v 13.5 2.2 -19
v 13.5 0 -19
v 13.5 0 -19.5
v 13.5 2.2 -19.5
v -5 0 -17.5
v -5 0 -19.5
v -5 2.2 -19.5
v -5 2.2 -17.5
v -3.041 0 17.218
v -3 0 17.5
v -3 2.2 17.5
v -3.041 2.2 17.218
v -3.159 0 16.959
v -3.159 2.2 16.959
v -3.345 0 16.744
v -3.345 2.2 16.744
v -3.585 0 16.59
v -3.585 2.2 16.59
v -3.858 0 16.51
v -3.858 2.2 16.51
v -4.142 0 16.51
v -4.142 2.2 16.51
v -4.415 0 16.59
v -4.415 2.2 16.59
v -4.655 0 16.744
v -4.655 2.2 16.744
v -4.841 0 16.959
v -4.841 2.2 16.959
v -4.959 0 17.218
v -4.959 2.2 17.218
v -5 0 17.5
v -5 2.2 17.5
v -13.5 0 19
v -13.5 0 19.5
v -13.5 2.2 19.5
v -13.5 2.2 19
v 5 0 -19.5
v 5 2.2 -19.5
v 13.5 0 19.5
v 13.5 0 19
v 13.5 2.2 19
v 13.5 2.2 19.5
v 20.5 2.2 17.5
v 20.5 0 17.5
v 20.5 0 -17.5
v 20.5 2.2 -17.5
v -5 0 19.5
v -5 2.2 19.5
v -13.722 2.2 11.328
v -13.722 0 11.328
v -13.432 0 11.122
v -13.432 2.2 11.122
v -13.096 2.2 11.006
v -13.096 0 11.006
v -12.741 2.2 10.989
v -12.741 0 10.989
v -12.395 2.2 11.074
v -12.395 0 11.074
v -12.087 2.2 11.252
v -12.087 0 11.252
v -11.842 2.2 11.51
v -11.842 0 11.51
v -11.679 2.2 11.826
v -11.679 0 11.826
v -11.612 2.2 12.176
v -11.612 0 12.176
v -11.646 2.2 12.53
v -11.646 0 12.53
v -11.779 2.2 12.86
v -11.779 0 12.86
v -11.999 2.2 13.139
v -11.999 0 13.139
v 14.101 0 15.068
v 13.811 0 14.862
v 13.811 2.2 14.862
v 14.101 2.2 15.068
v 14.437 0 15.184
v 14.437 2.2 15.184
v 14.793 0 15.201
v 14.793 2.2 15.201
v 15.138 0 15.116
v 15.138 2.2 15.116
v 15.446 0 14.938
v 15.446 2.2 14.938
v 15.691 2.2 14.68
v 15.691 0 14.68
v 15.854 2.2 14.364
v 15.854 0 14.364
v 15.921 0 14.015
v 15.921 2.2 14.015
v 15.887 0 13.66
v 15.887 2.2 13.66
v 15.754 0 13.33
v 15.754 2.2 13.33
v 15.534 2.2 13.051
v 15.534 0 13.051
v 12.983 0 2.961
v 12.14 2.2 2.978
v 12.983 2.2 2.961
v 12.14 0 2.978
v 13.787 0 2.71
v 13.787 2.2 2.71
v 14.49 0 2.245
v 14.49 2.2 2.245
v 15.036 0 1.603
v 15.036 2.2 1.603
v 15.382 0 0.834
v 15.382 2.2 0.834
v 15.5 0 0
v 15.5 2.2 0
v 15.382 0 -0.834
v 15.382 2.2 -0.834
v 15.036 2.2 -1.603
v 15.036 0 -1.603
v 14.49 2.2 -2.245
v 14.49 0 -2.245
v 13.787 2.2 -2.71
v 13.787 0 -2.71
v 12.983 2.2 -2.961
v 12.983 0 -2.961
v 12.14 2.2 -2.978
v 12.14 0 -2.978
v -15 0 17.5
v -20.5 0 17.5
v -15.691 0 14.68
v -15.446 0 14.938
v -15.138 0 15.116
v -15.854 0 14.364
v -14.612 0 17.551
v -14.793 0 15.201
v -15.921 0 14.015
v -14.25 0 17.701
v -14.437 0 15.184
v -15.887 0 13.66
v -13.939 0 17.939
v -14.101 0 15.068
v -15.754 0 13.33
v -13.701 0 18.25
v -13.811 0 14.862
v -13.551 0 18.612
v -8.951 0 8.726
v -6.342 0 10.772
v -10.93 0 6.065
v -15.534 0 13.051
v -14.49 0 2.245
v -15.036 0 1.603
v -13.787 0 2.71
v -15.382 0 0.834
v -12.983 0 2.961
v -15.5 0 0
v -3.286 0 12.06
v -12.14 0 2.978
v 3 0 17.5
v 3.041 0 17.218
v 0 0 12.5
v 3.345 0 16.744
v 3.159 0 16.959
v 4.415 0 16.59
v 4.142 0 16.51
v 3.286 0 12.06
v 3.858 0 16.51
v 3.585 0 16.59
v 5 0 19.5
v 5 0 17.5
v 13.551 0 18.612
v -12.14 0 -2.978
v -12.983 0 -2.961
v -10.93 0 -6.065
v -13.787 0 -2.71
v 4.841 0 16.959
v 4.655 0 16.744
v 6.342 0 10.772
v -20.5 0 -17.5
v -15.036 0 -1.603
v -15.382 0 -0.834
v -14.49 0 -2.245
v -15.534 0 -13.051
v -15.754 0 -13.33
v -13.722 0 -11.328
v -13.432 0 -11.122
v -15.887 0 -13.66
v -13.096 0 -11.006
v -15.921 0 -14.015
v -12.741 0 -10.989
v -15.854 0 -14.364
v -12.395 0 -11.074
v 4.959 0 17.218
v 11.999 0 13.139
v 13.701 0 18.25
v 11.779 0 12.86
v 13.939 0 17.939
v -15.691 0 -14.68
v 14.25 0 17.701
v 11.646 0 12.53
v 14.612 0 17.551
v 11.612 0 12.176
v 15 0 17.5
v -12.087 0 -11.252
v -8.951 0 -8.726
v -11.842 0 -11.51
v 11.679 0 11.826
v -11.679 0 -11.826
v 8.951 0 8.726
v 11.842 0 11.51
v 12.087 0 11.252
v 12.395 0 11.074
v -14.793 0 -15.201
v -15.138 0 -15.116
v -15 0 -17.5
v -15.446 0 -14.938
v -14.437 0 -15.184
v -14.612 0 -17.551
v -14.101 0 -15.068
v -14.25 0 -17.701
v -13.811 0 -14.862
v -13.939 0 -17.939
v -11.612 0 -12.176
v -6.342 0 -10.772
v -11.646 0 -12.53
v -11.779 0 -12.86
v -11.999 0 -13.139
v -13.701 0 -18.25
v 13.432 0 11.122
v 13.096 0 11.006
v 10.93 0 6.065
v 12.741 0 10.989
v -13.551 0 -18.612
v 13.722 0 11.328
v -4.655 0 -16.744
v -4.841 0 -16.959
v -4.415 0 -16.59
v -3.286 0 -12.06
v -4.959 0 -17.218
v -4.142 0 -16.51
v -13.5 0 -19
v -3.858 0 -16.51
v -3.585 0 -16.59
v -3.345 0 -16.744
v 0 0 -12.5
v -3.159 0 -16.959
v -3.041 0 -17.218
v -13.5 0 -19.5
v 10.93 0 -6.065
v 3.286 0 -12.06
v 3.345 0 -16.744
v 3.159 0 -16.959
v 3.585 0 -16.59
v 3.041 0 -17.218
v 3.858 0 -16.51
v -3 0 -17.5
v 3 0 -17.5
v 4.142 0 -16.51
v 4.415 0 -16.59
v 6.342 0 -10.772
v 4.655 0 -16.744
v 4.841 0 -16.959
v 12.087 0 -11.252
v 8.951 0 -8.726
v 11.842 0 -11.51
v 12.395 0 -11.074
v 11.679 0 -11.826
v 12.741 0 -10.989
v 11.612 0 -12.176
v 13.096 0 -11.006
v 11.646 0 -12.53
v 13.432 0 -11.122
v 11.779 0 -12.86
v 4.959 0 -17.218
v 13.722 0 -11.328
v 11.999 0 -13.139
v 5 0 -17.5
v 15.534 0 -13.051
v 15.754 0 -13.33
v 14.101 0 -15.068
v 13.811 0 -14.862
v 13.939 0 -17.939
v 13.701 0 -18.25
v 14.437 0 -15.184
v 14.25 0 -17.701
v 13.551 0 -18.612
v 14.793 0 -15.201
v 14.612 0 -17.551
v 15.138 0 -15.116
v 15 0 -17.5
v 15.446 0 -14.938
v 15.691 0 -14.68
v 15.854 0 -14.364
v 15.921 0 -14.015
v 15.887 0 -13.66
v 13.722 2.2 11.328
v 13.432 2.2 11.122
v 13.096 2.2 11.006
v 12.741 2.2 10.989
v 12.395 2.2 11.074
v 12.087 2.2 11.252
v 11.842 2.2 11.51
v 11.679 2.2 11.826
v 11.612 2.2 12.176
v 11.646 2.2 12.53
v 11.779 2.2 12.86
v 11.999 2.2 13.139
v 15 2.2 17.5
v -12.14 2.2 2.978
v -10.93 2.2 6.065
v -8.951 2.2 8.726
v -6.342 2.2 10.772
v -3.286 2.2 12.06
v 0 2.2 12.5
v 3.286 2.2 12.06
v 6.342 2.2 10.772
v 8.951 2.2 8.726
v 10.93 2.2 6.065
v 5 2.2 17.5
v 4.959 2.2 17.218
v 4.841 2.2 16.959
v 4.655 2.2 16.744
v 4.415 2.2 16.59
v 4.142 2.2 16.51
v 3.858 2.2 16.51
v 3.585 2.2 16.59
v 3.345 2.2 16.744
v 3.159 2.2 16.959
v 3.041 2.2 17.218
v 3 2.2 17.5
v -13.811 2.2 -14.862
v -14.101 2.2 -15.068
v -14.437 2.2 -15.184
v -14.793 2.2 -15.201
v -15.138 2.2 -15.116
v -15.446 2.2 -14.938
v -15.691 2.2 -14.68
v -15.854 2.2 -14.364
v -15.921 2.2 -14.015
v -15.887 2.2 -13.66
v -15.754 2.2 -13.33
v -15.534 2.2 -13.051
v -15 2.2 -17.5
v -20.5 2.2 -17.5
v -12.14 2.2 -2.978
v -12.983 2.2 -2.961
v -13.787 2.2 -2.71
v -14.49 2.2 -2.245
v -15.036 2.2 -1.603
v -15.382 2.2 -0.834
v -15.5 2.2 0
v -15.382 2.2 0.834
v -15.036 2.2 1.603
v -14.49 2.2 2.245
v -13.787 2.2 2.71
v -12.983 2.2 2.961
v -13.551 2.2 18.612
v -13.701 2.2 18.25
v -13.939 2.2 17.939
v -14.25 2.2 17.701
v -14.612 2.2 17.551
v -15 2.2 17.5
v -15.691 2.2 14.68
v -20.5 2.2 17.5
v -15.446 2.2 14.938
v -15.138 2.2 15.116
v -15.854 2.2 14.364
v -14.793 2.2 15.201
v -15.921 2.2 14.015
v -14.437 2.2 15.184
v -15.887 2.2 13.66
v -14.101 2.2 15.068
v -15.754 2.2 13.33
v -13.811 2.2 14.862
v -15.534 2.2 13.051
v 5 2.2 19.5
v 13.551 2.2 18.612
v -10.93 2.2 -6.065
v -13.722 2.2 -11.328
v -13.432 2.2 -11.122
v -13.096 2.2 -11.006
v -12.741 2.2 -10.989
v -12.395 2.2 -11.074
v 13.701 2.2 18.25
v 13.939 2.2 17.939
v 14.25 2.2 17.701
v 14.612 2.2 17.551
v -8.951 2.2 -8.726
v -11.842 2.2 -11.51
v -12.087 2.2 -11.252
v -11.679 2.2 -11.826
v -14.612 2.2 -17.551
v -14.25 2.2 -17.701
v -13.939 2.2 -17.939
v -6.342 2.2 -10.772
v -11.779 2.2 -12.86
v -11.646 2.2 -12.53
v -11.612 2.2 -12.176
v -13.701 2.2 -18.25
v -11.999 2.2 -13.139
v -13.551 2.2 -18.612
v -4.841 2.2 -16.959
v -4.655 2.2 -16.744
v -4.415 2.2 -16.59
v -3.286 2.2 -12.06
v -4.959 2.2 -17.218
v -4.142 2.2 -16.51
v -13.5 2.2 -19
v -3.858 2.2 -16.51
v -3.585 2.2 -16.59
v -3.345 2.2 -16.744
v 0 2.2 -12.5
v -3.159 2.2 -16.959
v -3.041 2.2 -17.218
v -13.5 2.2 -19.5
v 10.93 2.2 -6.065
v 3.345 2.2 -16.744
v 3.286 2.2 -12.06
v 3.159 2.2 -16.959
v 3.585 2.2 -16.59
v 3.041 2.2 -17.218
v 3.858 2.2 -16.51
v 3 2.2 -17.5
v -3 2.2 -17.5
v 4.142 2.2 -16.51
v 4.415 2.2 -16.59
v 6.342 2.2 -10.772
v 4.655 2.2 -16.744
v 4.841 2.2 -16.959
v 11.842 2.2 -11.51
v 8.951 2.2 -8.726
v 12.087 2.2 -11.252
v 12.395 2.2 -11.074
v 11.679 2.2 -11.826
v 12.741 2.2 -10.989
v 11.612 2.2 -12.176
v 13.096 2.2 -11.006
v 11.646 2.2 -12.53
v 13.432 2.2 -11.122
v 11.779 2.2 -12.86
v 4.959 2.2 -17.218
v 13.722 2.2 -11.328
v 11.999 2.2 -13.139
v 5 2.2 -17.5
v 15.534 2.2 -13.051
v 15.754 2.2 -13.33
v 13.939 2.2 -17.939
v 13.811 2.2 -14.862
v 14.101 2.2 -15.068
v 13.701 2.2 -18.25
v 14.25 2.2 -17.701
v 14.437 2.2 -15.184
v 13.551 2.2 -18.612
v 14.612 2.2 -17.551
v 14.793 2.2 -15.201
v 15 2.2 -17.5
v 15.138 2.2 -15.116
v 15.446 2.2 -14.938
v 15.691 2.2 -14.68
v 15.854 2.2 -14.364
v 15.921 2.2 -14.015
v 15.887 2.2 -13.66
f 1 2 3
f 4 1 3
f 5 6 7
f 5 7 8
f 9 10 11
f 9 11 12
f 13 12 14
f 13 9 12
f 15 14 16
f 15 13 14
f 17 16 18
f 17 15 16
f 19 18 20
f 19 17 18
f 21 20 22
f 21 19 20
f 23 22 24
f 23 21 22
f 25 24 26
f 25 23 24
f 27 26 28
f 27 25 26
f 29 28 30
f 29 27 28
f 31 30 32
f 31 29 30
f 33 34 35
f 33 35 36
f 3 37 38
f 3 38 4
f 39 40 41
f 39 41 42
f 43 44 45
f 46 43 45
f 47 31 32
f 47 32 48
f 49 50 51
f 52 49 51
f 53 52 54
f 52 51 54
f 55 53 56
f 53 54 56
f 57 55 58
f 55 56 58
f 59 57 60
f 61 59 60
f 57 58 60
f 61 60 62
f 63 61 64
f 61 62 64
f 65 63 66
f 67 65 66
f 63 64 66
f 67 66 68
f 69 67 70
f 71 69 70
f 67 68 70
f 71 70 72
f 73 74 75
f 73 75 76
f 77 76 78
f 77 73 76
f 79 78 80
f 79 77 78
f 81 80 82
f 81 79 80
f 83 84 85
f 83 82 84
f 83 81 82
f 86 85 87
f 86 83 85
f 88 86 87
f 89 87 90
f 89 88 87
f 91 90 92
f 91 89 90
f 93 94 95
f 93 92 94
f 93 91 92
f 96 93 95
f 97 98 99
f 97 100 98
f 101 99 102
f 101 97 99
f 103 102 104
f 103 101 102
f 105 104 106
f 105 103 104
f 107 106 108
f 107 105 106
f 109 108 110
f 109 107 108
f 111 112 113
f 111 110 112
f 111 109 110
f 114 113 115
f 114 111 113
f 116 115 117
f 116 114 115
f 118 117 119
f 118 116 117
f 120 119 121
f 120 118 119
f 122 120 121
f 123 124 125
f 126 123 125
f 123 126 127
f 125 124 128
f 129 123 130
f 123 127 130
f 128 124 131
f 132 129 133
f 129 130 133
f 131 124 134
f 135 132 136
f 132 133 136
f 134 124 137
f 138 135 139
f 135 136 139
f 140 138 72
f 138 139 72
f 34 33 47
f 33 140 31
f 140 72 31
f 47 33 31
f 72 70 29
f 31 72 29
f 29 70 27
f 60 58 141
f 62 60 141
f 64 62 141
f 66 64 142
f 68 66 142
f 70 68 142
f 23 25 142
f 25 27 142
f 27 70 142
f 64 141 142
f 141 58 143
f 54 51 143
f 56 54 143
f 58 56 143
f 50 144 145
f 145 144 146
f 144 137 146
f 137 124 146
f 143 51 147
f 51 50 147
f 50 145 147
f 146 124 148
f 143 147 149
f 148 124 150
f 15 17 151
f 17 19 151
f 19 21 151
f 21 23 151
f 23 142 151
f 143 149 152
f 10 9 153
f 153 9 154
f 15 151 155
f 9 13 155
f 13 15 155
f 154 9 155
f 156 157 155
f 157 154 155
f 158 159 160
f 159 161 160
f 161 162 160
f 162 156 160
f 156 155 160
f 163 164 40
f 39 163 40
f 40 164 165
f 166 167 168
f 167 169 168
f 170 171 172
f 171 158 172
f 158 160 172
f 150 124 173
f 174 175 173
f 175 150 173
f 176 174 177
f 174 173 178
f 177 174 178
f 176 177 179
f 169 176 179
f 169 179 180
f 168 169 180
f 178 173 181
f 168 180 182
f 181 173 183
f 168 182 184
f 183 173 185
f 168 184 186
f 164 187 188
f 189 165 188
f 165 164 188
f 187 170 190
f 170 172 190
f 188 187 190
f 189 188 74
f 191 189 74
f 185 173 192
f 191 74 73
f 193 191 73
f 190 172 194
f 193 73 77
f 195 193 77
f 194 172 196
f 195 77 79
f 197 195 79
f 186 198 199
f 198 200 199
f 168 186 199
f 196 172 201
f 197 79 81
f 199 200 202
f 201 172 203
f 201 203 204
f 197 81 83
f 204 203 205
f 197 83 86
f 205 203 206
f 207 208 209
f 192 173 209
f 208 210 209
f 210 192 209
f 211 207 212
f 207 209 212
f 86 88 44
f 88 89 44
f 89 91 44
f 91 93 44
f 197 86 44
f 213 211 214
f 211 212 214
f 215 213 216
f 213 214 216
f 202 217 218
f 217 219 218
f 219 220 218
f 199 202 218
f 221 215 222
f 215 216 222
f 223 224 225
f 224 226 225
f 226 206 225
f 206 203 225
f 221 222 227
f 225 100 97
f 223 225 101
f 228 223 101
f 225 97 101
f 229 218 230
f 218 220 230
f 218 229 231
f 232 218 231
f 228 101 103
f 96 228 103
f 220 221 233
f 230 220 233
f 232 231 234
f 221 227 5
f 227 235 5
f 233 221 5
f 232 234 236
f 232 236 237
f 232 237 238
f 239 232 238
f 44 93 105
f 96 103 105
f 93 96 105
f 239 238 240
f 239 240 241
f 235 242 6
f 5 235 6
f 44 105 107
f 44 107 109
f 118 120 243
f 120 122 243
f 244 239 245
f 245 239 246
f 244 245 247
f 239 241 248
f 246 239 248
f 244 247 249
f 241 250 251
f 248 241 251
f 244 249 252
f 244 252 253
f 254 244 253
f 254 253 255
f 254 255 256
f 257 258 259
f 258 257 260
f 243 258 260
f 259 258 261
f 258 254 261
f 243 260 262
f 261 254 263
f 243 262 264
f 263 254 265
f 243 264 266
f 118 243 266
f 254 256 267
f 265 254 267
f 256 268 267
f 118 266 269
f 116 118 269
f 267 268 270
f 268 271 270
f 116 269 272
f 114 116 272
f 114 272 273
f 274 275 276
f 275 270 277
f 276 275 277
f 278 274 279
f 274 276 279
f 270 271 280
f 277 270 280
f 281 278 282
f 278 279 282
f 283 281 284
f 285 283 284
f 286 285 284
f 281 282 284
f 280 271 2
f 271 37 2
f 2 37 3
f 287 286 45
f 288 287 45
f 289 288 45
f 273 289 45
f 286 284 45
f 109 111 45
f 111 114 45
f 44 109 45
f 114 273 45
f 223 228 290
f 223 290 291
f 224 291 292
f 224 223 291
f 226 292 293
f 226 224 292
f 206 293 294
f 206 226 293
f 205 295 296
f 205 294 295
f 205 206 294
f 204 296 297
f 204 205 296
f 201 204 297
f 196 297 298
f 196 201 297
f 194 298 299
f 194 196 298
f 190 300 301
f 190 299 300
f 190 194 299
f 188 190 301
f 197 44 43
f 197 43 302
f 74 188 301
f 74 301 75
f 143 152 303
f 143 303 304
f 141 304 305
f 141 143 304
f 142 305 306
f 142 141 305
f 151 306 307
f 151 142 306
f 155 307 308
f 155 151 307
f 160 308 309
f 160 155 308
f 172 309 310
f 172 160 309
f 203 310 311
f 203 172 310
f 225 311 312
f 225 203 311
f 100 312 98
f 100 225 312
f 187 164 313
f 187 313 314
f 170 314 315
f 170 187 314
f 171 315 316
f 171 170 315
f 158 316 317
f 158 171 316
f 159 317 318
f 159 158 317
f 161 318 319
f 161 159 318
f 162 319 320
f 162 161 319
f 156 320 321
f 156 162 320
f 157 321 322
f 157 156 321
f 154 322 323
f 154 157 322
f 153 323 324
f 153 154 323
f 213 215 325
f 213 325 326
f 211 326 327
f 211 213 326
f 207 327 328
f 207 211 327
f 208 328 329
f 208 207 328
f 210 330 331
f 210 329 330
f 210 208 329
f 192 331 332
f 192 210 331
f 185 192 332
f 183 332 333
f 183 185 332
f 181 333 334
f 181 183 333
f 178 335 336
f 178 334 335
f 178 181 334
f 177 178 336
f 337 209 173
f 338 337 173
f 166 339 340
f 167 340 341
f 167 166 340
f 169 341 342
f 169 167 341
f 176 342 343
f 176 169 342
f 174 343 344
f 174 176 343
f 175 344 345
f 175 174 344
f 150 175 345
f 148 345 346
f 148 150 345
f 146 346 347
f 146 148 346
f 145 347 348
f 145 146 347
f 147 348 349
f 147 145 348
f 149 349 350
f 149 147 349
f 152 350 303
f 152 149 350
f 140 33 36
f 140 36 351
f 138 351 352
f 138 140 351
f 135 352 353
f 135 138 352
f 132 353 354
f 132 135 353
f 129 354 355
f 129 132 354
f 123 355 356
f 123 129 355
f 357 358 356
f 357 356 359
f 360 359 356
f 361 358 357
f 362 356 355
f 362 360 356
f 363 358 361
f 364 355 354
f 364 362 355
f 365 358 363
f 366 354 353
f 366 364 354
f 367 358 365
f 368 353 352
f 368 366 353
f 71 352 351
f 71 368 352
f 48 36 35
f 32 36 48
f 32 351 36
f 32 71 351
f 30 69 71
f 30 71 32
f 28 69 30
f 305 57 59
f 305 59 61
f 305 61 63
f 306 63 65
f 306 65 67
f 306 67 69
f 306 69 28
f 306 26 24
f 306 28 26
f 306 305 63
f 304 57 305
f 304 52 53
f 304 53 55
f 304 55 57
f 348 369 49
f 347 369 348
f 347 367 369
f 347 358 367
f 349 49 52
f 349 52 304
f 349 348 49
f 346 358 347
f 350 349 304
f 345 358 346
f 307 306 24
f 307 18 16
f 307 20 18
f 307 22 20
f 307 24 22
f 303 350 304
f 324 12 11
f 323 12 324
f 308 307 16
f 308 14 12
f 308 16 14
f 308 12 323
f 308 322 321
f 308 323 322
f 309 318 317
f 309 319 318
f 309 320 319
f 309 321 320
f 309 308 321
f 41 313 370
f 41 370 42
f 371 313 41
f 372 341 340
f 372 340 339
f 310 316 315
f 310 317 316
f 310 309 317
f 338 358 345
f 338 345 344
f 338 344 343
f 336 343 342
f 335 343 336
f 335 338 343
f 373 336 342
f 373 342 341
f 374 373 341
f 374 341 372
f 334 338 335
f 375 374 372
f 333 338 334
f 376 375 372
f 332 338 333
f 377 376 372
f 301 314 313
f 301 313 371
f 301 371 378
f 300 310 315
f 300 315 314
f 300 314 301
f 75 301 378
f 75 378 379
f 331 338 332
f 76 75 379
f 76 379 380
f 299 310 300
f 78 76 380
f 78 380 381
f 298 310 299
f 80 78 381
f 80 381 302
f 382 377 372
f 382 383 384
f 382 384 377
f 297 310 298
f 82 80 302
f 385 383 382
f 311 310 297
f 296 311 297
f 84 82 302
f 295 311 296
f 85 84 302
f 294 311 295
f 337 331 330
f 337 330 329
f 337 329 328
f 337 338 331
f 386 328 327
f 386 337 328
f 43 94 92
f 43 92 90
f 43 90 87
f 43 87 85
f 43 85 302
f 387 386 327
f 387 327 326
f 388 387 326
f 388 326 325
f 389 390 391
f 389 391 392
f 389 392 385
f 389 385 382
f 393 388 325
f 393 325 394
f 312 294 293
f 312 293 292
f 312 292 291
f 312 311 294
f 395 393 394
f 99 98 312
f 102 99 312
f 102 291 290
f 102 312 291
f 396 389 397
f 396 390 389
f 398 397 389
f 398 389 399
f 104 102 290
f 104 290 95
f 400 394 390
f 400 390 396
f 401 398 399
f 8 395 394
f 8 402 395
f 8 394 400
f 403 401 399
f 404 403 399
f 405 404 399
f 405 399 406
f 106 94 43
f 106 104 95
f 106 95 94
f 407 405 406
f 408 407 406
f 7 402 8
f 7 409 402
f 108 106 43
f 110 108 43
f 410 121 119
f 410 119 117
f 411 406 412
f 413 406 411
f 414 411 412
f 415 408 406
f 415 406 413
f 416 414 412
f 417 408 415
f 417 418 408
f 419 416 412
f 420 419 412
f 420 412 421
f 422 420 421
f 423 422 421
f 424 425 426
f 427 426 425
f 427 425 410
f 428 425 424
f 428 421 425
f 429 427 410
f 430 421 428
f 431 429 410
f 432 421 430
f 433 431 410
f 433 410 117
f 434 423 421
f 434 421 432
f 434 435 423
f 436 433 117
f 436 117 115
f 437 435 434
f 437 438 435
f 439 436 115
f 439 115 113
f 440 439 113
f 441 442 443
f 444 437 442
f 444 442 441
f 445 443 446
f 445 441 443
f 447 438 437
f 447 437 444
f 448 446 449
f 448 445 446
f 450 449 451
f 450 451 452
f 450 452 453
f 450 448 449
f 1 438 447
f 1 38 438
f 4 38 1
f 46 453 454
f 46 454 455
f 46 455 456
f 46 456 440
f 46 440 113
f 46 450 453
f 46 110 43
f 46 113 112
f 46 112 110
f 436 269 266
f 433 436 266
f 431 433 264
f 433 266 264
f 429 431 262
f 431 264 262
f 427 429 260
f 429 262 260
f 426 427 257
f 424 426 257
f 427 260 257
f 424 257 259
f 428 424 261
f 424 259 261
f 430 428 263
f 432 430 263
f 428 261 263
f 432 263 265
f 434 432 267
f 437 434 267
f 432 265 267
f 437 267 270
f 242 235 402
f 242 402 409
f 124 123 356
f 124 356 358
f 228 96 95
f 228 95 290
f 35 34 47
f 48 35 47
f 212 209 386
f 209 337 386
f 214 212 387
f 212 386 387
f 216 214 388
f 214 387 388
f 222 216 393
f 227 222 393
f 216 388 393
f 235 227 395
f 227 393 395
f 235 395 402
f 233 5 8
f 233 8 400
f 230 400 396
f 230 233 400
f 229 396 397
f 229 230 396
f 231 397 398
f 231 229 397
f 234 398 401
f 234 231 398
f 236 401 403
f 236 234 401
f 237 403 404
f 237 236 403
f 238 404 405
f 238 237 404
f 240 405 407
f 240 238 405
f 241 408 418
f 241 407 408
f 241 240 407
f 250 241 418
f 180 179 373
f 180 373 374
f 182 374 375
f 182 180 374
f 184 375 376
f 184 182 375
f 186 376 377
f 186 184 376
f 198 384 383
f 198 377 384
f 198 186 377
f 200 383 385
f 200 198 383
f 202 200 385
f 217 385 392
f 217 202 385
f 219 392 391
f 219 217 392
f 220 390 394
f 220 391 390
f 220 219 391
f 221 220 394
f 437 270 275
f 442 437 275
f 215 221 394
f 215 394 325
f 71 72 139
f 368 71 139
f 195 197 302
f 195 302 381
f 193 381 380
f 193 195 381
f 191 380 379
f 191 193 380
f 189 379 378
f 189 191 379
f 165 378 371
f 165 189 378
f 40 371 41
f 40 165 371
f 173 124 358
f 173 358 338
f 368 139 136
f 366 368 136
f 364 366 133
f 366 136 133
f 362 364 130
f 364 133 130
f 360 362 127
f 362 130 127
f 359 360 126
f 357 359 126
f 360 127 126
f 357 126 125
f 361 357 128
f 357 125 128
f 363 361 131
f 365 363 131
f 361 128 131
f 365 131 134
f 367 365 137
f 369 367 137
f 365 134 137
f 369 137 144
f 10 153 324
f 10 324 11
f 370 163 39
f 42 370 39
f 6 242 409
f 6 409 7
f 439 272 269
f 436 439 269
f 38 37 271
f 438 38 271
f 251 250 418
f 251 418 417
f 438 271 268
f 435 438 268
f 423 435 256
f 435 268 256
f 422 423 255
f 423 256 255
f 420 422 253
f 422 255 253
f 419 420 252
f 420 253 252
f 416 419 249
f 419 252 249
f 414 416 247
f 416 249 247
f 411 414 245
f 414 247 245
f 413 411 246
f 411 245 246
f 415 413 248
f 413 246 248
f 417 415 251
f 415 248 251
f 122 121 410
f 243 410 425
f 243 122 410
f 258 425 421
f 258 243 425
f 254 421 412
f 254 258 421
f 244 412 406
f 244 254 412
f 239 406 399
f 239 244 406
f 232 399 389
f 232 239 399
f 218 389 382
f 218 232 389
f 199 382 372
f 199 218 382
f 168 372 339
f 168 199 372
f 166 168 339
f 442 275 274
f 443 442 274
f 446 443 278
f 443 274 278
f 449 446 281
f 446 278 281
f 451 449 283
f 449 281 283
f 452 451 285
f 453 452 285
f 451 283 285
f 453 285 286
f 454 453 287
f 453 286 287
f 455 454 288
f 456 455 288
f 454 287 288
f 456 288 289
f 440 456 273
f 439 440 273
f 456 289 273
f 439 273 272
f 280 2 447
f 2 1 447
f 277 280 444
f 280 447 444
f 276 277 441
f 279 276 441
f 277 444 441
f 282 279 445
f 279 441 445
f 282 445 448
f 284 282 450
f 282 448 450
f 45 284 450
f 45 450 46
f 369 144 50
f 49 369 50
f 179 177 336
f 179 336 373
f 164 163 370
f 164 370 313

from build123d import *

# Parameters (mm, degrees)
SKETCH1_W            = 41
SKETCH1_H            = 39
BOSS_EXTRUDE1_DEPTH  = 2.2
SKETCH2_R            = 12.5
CUT_EXTRUDE1_DEPTH   = 29.378512998
SKETCH3_R            = 3
CUT_EXTRUDE2_DEPTH   = 29.378512998
SKETCH4_W            = 7
SKETCH4_H            = 2
CUT_EXTRUDE3_DEPTH   = 29.378512998
FILLET1_R            = 1.5
FILLET1_OF_MIRROR1_R = 1.5
MIRROR3_DEPTH        = 2.2


# Read off the part's stored shape, not the designer's step: Mirror3
with BuildPart() as part:
    # Sketch1 → Boss-Extrude1 (new body)
    with BuildSketch(Plane(origin=(0, 0, 0), x_dir=(1, 0, 0), z_dir=(0, 1, 0))):
        Rectangle(SKETCH1_W, SKETCH1_H)
    extrude(amount=BOSS_EXTRUDE1_DEPTH)

    # Sketch2 → Cut-Extrude1 (cut, through all)
    with BuildSketch(Plane(origin=(0, 0, 0), x_dir=(1, 0, 0), z_dir=(0, 1, 0))):
        with Locations(Location((0, 0, 0), (0, 0, 270))):
            Circle(SKETCH2_R)
    extrude(amount=CUT_EXTRUDE1_DEPTH, mode=Mode.SUBTRACT)

    # Sketch3 → Cut-Extrude2 (cut, through all)
    with BuildSketch(Plane(origin=(0, 0, 0), x_dir=(1, 0, 0), z_dir=(0, 1, 0))):
        with Locations((12.5, 0)):
            Circle(SKETCH3_R)
        with Locations((-12.5, 0)):
            Circle(SKETCH3_R)
        with BuildLine():
            Line((11.999388387, 13.139241924), (13.810783542, 14.862276339))
            ThreePointArc((13.810783542, 14.862276339), (15.577998326, 14.818095969), (15.533817957, 13.050881184))
            Line((15.533817957, 13.050881184), (13.722422802, 11.327846769))
            ThreePointArc((13.722422802, 11.327846769), (11.955208018, 11.372027139), (11.999388387, 13.139241924))
        make_face()
        with BuildLine():
            Line((11.999388387, -13.139241924), (13.810783542, -14.862276339))
            ThreePointArc((13.810783542, -14.862276339), (15.577998326, -14.818095969), (15.533817957, -13.050881184))
            Line((15.533817957, -13.050881184), (13.722422802, -11.327846769))
            ThreePointArc((13.722422802, -11.327846769), (11.955208018, -11.372027139), (11.999388387, -13.139241924))
        make_face()
        with BuildLine():
            Line((-11.999388387, -13.139241924), (-13.810783542, -14.862276339))
            ThreePointArc((-13.810783542, -14.862276339), (-15.577998326, -14.818095969), (-15.533817957, -13.050881184))
            Line((-15.533817957, -13.050881184), (-13.722422802, -11.327846769))
            ThreePointArc((-13.722422802, -11.327846769), (-11.955208018, -11.372027139), (-11.999388387, -13.139241924))
        make_face()
        with BuildLine():
            Line((-11.999388387, 13.139241924), (-13.810783542, 14.862276339))
            ThreePointArc((-13.810783542, 14.862276339), (-15.577998326, 14.818095969), (-15.533817957, 13.050881184))
            Line((-15.533817957, 13.050881184), (-13.722422802, 11.327846769))
            ThreePointArc((-13.722422802, 11.327846769), (-11.955208018, 11.372027139), (-11.999388387, 13.139241924))
        make_face()
    extrude(amount=CUT_EXTRUDE2_DEPTH, mode=Mode.SUBTRACT)

    # Sketch4 → Cut-Extrude3 (cut, through all)
    with BuildSketch(Plane(origin=(0, 0, 0), x_dir=(1, 0, 0), z_dir=(0, 1, 0))):
        with Locations((17, 18.5)):
            Rectangle(SKETCH4_W, SKETCH4_H)
        with BuildLine():
            Line((0, 19.5), (5, 19.5))
            Line((5, 19.5), (5, 17.5))
            ThreePointArc((5, 17.5), (4, 16.5), (3, 17.5))
            Line((3, 17.5), (0, 17.5))
            Line((0, 17.5), (0, 19.5))
        make_face()
    cut_extrude3 = extrude(amount=CUT_EXTRUDE3_DEPTH, mode=Mode.SUBTRACT)

    # Fillet1
    fillet1_edges = [part.edges().sort_by_distance(p)[0] for p in [
        (13.5, 1.1, -17.5),
    ]]
    fillet(fillet1_edges, radius=FILLET1_R)

    # Mirror1: Cut-Extrude3 across plane
    add(cut_extrude3.mirror(Plane(origin=(0, 0, 0), x_dir=(0, 0, 1), z_dir=(1, 0, 0))), mode=Mode.SUBTRACT)

    # Fillet1 of Mirror1
    fillet1_of_mirror1_edges = [part.edges().sort_by_distance(p)[0] for p in [
        (-13.5, 1.1, -17.5),
    ]]
    fillet(fillet1_of_mirror1_edges, radius=FILLET1_OF_MIRROR1_R)

    # Mirror3 outline → Mirror3 (cut)
    with BuildSketch(Plane(origin=(0, 0, 0), x_dir=(1, 0, 0), z_dir=(0, 1, 0))):
        with BuildLine():
            Line((-5, -19.5), (5, -19.5))
            Line((5, -19.5), (5, -17.5))
            ThreePointArc((5, -17.5), (4, -16.5), (3, -17.5))
            Line((3, -17.5), (-3, -17.5))
            ThreePointArc((-3, -17.5), (-4, -16.5), (-5, -17.5))
            Line((-5, -17.5), (-5, -19.5))
        make_face()
        with BuildLine():
            Line((13.5, -19), (13.5, -19.5))
            Line((13.5, -19.5), (20.5, -19.5))
            Line((20.5, -19.5), (20.5, -17.5))
            Line((20.5, -17.5), (15, -17.5))
            ThreePointArc((15, -17.5), (13.939339828, -17.939339828), (13.5, -19))
        make_face()
        with BuildLine():
            Line((-20.5, -19.5), (-13.5, -19.5))
            Line((-13.5, -19.5), (-13.5, -19))
            ThreePointArc((-13.5, -19), (-13.939339828, -17.939339828), (-15, -17.5))
            Line((-15, -17.5), (-20.5, -17.5))
            Line((-20.5, -17.5), (-20.5, -19.5))
        make_face()
    extrude(amount=MIRROR3_DEPTH, mode=Mode.SUBTRACT)


solid = part.part
